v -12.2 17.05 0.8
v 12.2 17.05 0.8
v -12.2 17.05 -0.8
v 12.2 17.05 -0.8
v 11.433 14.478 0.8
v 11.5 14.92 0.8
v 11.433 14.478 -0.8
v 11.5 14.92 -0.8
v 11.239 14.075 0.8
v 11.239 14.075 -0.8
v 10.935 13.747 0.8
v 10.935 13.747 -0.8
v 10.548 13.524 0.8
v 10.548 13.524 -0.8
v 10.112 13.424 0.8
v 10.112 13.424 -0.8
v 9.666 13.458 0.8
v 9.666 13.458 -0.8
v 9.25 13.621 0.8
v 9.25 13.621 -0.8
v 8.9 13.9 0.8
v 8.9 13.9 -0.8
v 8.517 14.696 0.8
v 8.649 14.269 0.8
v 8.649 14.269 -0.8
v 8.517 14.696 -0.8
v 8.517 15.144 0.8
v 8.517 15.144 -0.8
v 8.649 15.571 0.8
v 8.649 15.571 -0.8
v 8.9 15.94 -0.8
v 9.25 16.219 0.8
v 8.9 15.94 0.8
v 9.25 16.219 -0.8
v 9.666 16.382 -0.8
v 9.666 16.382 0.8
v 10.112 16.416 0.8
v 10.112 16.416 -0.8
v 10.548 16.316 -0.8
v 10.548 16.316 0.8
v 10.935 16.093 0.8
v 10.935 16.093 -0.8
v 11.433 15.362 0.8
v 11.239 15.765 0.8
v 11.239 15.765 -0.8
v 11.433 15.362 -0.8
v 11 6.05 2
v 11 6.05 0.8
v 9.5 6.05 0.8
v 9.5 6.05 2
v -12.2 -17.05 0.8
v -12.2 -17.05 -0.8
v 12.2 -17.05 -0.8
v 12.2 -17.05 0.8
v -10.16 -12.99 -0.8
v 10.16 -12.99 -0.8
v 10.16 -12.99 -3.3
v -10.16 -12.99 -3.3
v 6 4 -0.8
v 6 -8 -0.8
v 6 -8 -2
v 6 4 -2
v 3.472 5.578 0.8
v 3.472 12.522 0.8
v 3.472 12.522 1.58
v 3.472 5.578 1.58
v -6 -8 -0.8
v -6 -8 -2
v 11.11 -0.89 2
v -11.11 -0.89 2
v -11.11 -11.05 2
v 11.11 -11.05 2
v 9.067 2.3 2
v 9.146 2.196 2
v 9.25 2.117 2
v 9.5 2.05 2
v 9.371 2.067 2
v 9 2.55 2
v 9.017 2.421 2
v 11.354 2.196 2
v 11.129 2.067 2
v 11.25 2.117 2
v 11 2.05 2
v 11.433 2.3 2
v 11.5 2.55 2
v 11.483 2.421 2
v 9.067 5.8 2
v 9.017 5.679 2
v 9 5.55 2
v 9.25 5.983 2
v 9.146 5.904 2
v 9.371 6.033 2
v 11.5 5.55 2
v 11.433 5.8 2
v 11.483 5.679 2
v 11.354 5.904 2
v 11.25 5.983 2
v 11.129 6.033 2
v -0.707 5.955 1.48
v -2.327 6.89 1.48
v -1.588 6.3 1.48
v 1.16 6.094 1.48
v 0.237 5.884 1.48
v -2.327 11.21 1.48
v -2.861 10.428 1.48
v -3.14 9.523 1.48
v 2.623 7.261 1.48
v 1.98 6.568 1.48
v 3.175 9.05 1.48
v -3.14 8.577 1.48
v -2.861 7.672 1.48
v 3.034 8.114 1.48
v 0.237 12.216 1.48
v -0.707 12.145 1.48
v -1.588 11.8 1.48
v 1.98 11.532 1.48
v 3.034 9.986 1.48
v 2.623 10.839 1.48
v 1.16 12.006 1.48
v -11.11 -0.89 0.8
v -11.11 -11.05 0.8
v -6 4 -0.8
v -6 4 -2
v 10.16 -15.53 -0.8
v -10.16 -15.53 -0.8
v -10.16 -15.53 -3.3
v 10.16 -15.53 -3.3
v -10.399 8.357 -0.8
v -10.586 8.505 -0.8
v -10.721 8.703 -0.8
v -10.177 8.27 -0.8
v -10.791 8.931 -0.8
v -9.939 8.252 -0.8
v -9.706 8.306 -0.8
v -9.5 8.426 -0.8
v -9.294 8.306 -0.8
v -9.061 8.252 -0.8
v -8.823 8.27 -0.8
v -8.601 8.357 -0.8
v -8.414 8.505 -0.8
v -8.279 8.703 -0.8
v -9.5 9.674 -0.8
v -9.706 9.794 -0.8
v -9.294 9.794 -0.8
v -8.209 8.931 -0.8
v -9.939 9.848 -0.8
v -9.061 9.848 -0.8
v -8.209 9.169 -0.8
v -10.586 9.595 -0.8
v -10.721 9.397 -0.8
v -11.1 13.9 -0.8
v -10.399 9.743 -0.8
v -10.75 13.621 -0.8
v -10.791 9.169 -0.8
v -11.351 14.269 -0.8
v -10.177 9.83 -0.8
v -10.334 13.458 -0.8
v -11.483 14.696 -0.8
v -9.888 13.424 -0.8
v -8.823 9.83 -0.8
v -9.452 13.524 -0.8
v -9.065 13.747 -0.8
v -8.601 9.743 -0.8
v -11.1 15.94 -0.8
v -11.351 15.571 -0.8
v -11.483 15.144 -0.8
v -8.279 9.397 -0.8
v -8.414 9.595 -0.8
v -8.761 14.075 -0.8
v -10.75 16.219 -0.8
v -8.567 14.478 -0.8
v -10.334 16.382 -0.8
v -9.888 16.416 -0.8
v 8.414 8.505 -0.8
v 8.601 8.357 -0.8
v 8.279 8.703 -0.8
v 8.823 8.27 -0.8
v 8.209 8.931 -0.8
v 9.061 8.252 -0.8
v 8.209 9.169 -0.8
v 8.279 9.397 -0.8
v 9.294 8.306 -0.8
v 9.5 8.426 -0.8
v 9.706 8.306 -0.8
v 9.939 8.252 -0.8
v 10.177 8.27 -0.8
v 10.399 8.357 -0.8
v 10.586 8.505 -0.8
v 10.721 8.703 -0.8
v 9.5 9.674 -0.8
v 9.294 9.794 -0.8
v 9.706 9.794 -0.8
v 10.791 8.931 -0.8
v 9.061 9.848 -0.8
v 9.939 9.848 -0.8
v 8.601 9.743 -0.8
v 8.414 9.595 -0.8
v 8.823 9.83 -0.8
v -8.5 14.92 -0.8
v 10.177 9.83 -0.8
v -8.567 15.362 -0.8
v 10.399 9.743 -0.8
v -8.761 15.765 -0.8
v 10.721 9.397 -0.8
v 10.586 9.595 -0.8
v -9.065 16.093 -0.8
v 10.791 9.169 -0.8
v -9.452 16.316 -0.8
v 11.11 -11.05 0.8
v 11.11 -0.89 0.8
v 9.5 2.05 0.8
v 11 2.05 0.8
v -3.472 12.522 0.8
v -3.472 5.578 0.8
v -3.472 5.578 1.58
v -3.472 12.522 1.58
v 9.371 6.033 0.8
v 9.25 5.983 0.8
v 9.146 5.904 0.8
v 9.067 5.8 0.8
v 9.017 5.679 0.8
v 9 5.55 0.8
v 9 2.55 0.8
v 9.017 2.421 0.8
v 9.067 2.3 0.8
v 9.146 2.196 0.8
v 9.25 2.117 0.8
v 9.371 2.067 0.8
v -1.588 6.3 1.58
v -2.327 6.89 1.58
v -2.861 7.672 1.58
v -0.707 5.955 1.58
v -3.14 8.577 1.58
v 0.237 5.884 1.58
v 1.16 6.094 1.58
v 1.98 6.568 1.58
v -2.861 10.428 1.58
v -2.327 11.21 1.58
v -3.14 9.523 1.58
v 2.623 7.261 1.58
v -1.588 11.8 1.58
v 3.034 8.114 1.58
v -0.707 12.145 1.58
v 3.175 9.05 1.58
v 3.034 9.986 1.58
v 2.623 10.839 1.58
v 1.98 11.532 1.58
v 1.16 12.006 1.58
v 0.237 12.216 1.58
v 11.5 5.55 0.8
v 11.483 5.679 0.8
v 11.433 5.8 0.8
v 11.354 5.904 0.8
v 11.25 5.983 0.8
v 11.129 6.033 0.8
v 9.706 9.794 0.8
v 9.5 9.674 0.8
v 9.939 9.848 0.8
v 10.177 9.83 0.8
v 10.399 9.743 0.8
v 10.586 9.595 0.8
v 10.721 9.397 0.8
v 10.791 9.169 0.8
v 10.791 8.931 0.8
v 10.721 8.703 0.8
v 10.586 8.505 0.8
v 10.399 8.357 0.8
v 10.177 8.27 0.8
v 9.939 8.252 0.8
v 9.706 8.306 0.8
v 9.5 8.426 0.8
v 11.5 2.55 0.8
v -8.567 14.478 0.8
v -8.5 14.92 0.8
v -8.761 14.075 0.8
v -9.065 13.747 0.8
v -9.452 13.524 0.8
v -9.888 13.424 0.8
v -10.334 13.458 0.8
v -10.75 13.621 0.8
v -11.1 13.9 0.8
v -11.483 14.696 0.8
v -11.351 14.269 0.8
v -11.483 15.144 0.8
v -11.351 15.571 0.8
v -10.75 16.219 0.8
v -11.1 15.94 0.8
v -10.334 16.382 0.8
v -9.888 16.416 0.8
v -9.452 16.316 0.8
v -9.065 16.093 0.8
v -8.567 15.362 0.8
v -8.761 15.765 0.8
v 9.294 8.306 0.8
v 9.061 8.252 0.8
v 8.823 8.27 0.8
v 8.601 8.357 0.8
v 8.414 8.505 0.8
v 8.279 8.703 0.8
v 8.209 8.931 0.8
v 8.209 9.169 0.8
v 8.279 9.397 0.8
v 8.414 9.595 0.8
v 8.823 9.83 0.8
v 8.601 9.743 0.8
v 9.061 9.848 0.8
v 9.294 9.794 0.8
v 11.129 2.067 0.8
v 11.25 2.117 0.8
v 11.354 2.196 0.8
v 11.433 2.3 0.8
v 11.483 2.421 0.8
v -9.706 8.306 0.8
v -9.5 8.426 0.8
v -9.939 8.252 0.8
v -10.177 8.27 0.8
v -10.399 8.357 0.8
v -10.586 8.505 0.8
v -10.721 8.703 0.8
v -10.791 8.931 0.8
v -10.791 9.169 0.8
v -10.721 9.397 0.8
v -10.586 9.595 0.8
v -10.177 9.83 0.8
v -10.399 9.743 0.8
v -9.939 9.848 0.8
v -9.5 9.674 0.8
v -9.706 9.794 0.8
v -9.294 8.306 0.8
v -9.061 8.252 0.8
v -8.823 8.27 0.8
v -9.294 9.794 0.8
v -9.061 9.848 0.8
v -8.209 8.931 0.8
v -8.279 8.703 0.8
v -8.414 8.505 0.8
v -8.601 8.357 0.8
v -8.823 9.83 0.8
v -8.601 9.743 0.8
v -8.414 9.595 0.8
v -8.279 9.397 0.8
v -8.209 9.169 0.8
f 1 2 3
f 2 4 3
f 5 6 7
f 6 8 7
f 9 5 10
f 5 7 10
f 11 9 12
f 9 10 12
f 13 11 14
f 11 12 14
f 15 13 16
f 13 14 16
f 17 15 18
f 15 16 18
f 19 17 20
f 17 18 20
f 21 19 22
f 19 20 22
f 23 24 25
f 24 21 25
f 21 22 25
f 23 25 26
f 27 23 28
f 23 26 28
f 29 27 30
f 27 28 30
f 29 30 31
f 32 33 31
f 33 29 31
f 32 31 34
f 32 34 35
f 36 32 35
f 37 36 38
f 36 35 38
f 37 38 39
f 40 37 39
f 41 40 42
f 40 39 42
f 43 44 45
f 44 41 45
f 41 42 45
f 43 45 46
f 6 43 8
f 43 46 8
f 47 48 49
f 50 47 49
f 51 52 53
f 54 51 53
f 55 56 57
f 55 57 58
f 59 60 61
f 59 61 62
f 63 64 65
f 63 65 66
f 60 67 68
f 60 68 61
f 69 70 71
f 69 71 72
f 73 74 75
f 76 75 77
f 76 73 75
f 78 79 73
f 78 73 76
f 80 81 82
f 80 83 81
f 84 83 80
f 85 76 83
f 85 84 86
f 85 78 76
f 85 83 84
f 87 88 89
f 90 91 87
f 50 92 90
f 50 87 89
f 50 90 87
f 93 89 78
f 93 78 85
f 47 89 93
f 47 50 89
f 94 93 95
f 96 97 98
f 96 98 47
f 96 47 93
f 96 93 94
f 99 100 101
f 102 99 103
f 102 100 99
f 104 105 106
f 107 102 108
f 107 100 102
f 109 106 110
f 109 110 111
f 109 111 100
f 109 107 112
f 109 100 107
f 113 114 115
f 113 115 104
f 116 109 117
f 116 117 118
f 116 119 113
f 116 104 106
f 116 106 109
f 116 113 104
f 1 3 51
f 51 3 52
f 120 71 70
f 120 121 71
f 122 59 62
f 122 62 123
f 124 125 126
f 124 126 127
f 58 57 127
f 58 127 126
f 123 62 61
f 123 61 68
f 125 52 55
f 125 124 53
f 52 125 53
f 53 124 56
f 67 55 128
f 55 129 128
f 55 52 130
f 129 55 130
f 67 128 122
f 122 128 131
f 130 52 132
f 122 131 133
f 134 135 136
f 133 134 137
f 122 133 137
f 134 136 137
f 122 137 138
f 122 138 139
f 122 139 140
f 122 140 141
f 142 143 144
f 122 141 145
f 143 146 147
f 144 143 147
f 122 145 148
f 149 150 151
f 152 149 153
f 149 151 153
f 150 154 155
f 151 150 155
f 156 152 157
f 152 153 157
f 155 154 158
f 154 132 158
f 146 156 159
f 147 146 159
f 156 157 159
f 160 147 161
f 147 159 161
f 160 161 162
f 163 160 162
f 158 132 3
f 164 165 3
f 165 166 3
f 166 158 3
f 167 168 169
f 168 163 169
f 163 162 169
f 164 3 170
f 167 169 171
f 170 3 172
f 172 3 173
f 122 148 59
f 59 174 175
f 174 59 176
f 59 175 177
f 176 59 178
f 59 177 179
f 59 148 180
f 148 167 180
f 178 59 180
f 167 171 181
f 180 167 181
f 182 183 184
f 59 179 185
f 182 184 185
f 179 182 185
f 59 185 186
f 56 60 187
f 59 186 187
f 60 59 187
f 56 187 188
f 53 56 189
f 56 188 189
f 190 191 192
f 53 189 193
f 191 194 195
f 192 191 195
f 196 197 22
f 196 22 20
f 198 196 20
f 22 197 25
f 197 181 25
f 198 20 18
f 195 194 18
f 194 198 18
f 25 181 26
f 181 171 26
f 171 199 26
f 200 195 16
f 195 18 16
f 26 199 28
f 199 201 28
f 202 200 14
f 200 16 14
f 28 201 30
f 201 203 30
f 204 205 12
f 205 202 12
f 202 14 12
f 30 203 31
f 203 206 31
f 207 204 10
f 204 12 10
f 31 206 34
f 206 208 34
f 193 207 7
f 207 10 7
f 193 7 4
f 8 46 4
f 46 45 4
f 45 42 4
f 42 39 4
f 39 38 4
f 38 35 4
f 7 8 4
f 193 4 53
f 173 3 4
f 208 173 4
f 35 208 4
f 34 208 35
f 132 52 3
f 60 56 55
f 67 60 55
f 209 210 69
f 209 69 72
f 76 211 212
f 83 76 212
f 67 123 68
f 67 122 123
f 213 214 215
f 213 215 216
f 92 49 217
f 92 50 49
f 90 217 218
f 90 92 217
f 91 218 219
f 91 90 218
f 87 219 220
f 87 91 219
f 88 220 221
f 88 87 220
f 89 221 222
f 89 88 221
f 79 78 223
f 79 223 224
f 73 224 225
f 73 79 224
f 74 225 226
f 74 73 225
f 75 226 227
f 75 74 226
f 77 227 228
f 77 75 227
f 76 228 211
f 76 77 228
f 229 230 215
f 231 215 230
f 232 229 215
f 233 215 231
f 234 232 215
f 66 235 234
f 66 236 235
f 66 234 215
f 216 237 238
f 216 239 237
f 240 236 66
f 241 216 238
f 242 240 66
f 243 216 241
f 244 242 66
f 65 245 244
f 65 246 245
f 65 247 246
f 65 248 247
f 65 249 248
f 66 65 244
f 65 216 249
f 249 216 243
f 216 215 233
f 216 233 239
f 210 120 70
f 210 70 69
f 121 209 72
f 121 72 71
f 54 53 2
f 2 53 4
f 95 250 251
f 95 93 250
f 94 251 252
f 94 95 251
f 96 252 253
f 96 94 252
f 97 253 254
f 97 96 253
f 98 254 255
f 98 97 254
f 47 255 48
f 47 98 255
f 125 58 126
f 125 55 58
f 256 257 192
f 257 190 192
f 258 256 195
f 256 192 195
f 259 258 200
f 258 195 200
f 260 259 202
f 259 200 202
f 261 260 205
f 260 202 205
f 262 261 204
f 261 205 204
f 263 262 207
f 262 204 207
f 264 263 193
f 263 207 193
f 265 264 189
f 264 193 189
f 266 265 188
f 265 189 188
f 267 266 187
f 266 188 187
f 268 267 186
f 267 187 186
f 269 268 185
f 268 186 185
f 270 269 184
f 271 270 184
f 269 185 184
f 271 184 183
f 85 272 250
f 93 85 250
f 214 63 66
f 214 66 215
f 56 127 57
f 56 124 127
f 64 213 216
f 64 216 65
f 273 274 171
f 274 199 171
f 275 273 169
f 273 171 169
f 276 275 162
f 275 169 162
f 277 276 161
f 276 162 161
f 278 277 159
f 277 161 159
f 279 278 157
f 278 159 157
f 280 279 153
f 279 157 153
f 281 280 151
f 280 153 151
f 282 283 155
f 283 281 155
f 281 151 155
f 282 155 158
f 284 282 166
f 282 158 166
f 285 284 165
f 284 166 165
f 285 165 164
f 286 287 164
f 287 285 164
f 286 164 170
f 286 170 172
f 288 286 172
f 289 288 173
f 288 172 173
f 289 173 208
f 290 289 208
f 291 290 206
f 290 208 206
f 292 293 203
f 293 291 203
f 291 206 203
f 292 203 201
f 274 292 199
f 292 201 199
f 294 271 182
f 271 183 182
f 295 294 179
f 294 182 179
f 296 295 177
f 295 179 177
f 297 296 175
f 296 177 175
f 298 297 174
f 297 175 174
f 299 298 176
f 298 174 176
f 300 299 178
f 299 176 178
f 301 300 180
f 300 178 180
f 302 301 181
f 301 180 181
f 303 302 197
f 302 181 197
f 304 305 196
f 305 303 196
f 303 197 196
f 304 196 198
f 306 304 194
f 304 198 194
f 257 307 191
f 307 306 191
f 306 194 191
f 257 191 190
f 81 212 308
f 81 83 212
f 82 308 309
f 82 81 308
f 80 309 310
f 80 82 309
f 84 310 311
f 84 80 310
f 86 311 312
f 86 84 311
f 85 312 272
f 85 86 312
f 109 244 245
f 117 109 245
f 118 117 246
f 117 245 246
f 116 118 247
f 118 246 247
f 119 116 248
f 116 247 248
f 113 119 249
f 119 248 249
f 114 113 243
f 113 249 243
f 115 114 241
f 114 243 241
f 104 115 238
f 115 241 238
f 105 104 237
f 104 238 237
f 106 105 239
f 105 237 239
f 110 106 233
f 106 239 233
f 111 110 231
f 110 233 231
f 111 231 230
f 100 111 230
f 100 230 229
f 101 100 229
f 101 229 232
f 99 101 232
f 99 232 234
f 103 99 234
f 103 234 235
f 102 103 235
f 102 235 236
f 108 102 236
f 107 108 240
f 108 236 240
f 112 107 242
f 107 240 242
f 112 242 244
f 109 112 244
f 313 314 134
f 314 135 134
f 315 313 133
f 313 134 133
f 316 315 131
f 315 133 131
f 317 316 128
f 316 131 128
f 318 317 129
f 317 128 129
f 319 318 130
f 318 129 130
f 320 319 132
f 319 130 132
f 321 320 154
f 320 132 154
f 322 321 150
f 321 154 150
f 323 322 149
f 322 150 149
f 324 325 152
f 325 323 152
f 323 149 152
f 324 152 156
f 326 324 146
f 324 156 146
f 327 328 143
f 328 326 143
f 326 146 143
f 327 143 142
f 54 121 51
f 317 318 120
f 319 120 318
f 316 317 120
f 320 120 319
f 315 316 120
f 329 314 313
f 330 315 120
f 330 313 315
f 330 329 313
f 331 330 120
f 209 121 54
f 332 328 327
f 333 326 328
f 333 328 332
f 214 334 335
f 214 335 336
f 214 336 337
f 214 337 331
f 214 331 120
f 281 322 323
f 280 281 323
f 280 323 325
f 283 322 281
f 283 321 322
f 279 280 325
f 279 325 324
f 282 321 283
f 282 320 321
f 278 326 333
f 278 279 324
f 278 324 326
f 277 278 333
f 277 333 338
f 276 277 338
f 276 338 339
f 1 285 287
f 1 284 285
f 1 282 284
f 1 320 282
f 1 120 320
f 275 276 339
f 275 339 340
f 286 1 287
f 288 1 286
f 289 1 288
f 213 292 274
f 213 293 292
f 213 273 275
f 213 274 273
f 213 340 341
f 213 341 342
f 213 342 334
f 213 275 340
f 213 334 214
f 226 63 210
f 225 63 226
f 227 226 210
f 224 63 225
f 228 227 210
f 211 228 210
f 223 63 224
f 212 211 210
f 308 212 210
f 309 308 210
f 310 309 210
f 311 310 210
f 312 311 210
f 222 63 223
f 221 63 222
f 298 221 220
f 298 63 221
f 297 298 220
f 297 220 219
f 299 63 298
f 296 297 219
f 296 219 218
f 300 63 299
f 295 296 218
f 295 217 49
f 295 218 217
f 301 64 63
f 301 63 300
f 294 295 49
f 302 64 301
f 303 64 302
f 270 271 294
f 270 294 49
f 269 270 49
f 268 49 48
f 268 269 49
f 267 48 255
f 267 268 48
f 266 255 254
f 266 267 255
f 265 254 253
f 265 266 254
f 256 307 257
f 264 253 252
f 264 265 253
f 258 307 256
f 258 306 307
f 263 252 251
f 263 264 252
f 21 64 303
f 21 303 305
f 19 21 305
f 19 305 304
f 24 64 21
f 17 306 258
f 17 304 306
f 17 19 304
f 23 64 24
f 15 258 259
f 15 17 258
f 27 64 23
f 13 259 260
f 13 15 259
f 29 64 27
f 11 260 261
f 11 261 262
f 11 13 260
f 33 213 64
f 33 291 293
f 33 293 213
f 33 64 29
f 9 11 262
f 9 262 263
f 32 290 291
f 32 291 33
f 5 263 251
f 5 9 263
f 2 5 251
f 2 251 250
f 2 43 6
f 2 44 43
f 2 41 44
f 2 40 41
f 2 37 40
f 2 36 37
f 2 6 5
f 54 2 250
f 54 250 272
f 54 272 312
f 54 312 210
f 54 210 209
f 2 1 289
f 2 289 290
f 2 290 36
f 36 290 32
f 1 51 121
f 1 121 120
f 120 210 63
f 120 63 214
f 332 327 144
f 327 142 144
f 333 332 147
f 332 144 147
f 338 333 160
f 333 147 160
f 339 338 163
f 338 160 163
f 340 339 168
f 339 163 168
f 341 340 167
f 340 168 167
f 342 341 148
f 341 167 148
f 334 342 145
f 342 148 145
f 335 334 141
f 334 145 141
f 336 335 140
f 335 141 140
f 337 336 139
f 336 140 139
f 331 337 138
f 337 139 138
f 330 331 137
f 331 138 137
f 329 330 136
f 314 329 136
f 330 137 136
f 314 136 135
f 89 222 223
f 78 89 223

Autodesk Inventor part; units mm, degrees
ref_plane "YZ Plane" through (0, 0, 0) normal (1, 0, 0) x (0, 1, 0)
ref_plane "XZ Plane" through (0, 0, 0) normal (0, 1, 0) x (-1, 0, 0)
ref_plane "XY Plane" through (0, 0, 0) normal (0, 0, 1) x (1, 0, 0)
sketch "Sketch1" plane through (0, 0, 0) normal (0, 0, 1) x (1, 0, 0)
  line L0 (-12.2, -17.05) -> (12.2, -17.05)
  line L1 (12.2, -17.05) -> (12.2, 17.05)
  line L2 (12.2, 17.05) -> (-12.2, 17.05)
  line L3 (-12.2, 17.05) -> (-12.2, -17.05)
  line L4 (-12.2, -17.05) -> (12.2, 17.05) construction
  line L5 (12.2, -17.05) -> (-12.2, 17.05) construction
  circle A0 centre (-10, 14.92) radius 1.5
  circle A1 centre (10, 14.92) radius 1.5
  line L6 (-10, 14.92) -> (10, 14.92) construction
  circle A2 centre (-9, 9.05) radius 0.8
  circle A3 centre (-10, 9.05) radius 0.8
  circle A4 centre (9, 9.05) radius 0.8
  circle A5 centre (10, 9.05) radius 0.8
  line L7 (-9, 9.05) -> (9, 9.05) construction
  line L8 (-10, 9.05) -> (10, 9.05) construction
  point P0 (0, 0)
  point P1 (0, 9.05)
  point P2 (0, 14.92)
  point P3 (0, 0)
  point P4 (0, 0)
  dimension "d0" = 24.4
  dimension "d1" = 34.1
  dimension "d2" = 2.13
  dimension "d3" = 3
  dimension "d4" = 10
  dimension "d13" = 20
  dimension "d14" = 18
  dimension "d15" = 1.6
  dimension "d16" = 8
extrude "Extrusion1" add sketch "Sketch1" along normal mid plane 1.6
sketch "Sketch2" plane through (0, 0, -0.8) normal (0, 0, -1) x (-1, 0, 0)
  circle A0 centre (-10, 14.92) radius 1.5 projected
  circle A1 centre (10, 14.92) radius 1.5 projected
  line L0 (-12.2, -17.05) -> (12.2, -17.05) projected
  line L1 (12.2, -17.05) -> (12.2, 17.05) projected
  line L2 (12.2, 17.05) -> (-12.2, 17.05) projected
  line L3 (-12.2, 17.05) -> (-12.2, -17.05) projected
  line L4 (-10.16, -12.99) -> (10.16, -12.99)
  line L5 (10.16, -12.99) -> (10.16, -15.53)
  line L6 (10.16, -15.53) -> (-10.16, -15.53)
  line L7 (-10.16, -15.53) -> (-10.16, -12.99)
  point P0 (0, 0)
  point P1 (0, -12.99)
  point P2 (-10.16, -14.26)
  dimension "d8" = 2.54
  dimension "d9" = 20.32
  dimension "d10" = 2.79
extrude "Extrusion2" add sketch "Sketch2" along normal blind 2.5 contours L4 L5 L6 L7
sketch "Sketch3" plane through (0, 0, 0.8) normal (0, 0, 1) x (1, 0, 0)
  circle A0 centre (10, 14.92) radius 1.5 projected
  circle A1 centre (-10, 14.92) radius 1.5 projected
  arc A2 (-9.5, 8.4255) -> (-9.5, 9.6745) centre (-9, 9.05) ccw projected
  arc A3 (-9.5, 9.6745) -> (-9.5, 8.4255) centre (-10, 9.05) ccw projected
  line L0 (-12.2, -17.05) -> (12.2, -17.05) projected
  line L1 (12.2, -17.05) -> (12.2, 17.05) projected
  line L2 (12.2, 17.05) -> (-12.2, 17.05) projected
  line L3 (-12.2, 17.05) -> (-12.2, -17.05) projected
  arc A4 (9.5, 9.6745) -> (9.5, 8.4255) centre (9, 9.05) ccw projected
  arc A5 (9.5, 8.4255) -> (9.5, 9.6745) centre (10, 9.05) ccw projected
  line L4 (-3.4725, 12.5225) -> (3.4725, 12.5225)
  line L5 (3.4725, 12.5225) -> (3.4725, 5.5775)
  line L6 (3.4725, 5.5775) -> (-3.4725, 5.5775)
  line L7 (-3.4725, 5.5775) -> (-3.4725, 12.5225)
  point P0 (0, 0)
  point P1 (3.4725, 9.05)
  point P2 (0, 12.5225)
  dimension "d17" = 6.945
extrude "Extrusion3" add sketch "Sketch3" along normal blind 0.78 contours L4 L5 L6 L7
sketch "Sketch4" plane through (0, 0, 1.58) normal (0, 0, 1) x (1, 0, 0)
  line L0 (3.4725, 12.5225) -> (-3.4725, 12.5225) projected
  line L1 (-3.4725, 12.5225) -> (-3.4725, 5.5775) projected
  line L2 (-3.4725, 5.5775) -> (3.4725, 5.5775) projected
  line L3 (3.4725, 5.5775) -> (3.4725, 12.5225) projected
  circle A0 centre (0, 9.05) radius 3.175
  point P0 (0, 0)
  point P1 (0, 12.5225)
  point P2 (-3.4725, 9.05)
  dimension "d20" = 6.35
extrude "Extrusion4" cut sketch "Sketch4" against normal blind 0.1 contours A0
sketch "Sketch5" plane through (0, 0, 0.8) normal (0, 0, 1) x (1, 0, 0)
  line L0 (3.4725, 12.5225) -> (3.4725, 5.5775) projected
  line L1 (3.4725, 5.5775) -> (-3.4725, 5.5775) projected
  line L2 (-3.4725, 5.5775) -> (-3.4725, 12.5225) projected
  line L3 (-3.4725, 12.5225) -> (3.4725, 12.5225) projected
  circle A0 centre (10, 14.92) radius 1.5 projected
  circle A1 centre (-10, 14.92) radius 1.5 projected
  arc A2 (-9.5, 8.4255) -> (-9.5, 9.6745) centre (-9, 9.05) ccw projected
  arc A3 (-9.5, 9.6745) -> (-9.5, 8.4255) centre (-10, 9.05) ccw projected
  line L4 (-12.2, -17.05) -> (12.2, -17.05) projected
  line L5 (12.2, -17.05) -> (12.2, 17.05) projected
  line L6 (12.2, 17.05) -> (-12.2, 17.05) projected
  line L7 (-12.2, 17.05) -> (-12.2, -17.05) projected
  arc A4 (9.5, 9.6745) -> (9.5, 8.4255) centre (9, 9.05) ccw projected
  arc A5 (9.5, 8.4255) -> (9.5, 9.6745) centre (10, 9.05) ccw projected
  line L8 (-11.11, -0.89) -> (11.11, -0.89)
  line L9 (11.11, -0.89) -> (11.11, -11.05)
  line L10 (11.11, -11.05) -> (-11.11, -11.05)
  line L11 (-11.11, -11.05) -> (-11.11, -0.89)
  circle A6 centre (0, 9.05) radius 3.175 projected
  line L12 (0, 1.05) -> (0, -12.99)
  point P0 (0, 0)
  point P1 (0, -0.89)
  point P2 (-11.11, -5.97)
  point P3 (0, -5.97)
  dimension "d24" = 22.22
  dimension "d25" = 10.16
  dimension "d26" = 8
extrude "Extrusion5" add sketch "Sketch5" along normal blind 1.2 contours L8 L12 L10 L11 | L8 L9 L10 L12
sketch "Sketch6" plane through (0, 0, 0.8) normal (0, 0, 1) x (1, 0, 0)
  line L0 (11.11, -0.89) -> (11.11, -11.05) projected
  line L1 (11.11, -11.05) -> (-11.11, -11.05) projected
  line L2 (-11.11, -11.05) -> (-11.11, -0.89) projected
  line L3 (-11.11, -0.89) -> (11.11, -0.89) projected
  line L4 (3.4725, 12.5225) -> (3.4725, 5.5775) projected
  line L5 (3.4725, 5.5775) -> (-3.4725, 5.5775) projected
  line L6 (-3.4725, 5.5775) -> (-3.4725, 12.5225) projected
  line L7 (-3.4725, 12.5225) -> (3.4725, 12.5225) projected
  circle A0 centre (10, 14.92) radius 1.5 projected
  circle A1 centre (-10, 14.92) radius 1.5 projected
  arc A2 (-9.5, 8.4255) -> (-9.5, 9.6745) centre (-9, 9.05) ccw projected
  arc A3 (-9.5, 9.6745) -> (-9.5, 8.4255) centre (-10, 9.05) ccw projected
  line L8 (-12.2, -17.05) -> (12.2, -17.05) projected
  line L9 (12.2, -17.05) -> (12.2, 17.05) projected
  line L10 (12.2, 17.05) -> (-12.2, 17.05) projected
  line L11 (-12.2, 17.05) -> (-12.2, -17.05) projected
  arc A4 (9.5, 9.6745) -> (9.5, 8.4255) centre (9, 9.05) ccw projected
  arc A5 (9.5, 8.4255) -> (9.5, 9.6745) centre (10, 9.05) ccw projected
  line L12 (11.5, 6.05) -> (9, 6.05)
  line L13 (9, 6.05) -> (9, 2.05)
  line L14 (9, 2.05) -> (11.5, 2.05)
  line L15 (11.5, 2.05) -> (11.5, 6.05)
  line L16 (12.2, 17.05) -> (-12.2, 17.05) construction
  line L17 (-8, 1.05) -> (8, 1.05) construction
  line L18 (8, 1.05) -> (8, 17.05) construction
  line L19 (8, 17.05) -> (-8, 17.05) construction
  line L20 (-8, 17.05) -> (-8, 1.05) construction
  line L21 (-8, 1.05) -> (8, 17.05) construction
  line L22 (8, 1.05) -> (-8, 17.05) construction
  circle A6 centre (0, 9.05) radius 3.175 construction
  point P0 (0, 0)
  dimension "d29" = 2.5
  dimension "d30" = 4
  dimension "d31" = 3
  dimension "d32" = 9
extrude "Extrusion6" add sketch "Sketch6" along normal blind 1.2 contours L15 L14 L13 L12
sketch "Sketch7" plane through (0, 0, -0.8) normal (0, 0, -1) x (-1, 0, 0)
  line L0 (6, -8) -> (-6, -8)
  line L1 (-6, -8) -> (-6, 4)
  line L2 (-6, 4) -> (6, 4)
  line L3 (6, 4) -> (6, -8)
  line L4 (6, -8) -> (-6, 4) construction
  line L5 (-6, -8) -> (6, 4) construction
  point P0 (0, 0)
  point P1 (0, -2)
  point P2 (0, -2)
  dimension "d35" = 12
  dimension "d36" = 2
extrude "Extrusion7" add sketch "Sketch7" along normal blind 1.2
fillet "Fillet1" radius 0.5 4 edges at (9, 6.05, 1.4) (11.5, 6.05, 1.4) (11.5, 2.05, 1.4) (9, 2.05, 1.4)
equation "\"d9\" = 8 * d8"
properties part number "66-0005" material "Epoxy Resin"
